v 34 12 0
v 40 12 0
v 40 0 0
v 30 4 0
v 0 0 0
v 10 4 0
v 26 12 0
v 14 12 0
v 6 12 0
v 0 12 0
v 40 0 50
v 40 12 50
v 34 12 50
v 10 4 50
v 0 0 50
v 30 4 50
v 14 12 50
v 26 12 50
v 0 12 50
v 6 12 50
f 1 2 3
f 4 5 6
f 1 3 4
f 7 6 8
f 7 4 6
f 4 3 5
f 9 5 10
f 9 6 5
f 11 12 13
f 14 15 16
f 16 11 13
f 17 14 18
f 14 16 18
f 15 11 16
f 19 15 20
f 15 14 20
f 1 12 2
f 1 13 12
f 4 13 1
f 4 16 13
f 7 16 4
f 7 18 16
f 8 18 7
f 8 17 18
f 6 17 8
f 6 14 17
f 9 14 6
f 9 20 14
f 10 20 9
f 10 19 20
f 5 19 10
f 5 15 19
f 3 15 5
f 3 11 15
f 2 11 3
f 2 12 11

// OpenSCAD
$fn = 32;

// ----------------------------------------------------------------------
// V guide rail: doublev, 40 mm wide
// ----------------------------------------------------------------------

// --- parameters (mm) ---
rail_w = 40;              // rail width, X
base_t = 12;              // base plate thickness
v_depth = 8;              // V feature depth / height
v_half_w = 8;             // half width of the V at the base face
plate_t = 50;             // rail length, Z (the extrusion height)
groove_off = 10;          // offset of each groove from the centreline

centre_x = rail_w / 2;  // rail centreline
groove_a = centre_x - groove_off;  // axis of the first groove
groove_b = centre_x + groove_off;  // axis of the second groove

profile = [[0, 0], [40, 0], [40, 12], [34, 12], [30, 4], [26, 12], [14, 12], [10, 4], [6, 12], [0, 12]];  // primary outline, 10 points, counter clockwise

// --- the one profile operation ---
linear_extrude(height = plate_t) polygon(points = profile);
